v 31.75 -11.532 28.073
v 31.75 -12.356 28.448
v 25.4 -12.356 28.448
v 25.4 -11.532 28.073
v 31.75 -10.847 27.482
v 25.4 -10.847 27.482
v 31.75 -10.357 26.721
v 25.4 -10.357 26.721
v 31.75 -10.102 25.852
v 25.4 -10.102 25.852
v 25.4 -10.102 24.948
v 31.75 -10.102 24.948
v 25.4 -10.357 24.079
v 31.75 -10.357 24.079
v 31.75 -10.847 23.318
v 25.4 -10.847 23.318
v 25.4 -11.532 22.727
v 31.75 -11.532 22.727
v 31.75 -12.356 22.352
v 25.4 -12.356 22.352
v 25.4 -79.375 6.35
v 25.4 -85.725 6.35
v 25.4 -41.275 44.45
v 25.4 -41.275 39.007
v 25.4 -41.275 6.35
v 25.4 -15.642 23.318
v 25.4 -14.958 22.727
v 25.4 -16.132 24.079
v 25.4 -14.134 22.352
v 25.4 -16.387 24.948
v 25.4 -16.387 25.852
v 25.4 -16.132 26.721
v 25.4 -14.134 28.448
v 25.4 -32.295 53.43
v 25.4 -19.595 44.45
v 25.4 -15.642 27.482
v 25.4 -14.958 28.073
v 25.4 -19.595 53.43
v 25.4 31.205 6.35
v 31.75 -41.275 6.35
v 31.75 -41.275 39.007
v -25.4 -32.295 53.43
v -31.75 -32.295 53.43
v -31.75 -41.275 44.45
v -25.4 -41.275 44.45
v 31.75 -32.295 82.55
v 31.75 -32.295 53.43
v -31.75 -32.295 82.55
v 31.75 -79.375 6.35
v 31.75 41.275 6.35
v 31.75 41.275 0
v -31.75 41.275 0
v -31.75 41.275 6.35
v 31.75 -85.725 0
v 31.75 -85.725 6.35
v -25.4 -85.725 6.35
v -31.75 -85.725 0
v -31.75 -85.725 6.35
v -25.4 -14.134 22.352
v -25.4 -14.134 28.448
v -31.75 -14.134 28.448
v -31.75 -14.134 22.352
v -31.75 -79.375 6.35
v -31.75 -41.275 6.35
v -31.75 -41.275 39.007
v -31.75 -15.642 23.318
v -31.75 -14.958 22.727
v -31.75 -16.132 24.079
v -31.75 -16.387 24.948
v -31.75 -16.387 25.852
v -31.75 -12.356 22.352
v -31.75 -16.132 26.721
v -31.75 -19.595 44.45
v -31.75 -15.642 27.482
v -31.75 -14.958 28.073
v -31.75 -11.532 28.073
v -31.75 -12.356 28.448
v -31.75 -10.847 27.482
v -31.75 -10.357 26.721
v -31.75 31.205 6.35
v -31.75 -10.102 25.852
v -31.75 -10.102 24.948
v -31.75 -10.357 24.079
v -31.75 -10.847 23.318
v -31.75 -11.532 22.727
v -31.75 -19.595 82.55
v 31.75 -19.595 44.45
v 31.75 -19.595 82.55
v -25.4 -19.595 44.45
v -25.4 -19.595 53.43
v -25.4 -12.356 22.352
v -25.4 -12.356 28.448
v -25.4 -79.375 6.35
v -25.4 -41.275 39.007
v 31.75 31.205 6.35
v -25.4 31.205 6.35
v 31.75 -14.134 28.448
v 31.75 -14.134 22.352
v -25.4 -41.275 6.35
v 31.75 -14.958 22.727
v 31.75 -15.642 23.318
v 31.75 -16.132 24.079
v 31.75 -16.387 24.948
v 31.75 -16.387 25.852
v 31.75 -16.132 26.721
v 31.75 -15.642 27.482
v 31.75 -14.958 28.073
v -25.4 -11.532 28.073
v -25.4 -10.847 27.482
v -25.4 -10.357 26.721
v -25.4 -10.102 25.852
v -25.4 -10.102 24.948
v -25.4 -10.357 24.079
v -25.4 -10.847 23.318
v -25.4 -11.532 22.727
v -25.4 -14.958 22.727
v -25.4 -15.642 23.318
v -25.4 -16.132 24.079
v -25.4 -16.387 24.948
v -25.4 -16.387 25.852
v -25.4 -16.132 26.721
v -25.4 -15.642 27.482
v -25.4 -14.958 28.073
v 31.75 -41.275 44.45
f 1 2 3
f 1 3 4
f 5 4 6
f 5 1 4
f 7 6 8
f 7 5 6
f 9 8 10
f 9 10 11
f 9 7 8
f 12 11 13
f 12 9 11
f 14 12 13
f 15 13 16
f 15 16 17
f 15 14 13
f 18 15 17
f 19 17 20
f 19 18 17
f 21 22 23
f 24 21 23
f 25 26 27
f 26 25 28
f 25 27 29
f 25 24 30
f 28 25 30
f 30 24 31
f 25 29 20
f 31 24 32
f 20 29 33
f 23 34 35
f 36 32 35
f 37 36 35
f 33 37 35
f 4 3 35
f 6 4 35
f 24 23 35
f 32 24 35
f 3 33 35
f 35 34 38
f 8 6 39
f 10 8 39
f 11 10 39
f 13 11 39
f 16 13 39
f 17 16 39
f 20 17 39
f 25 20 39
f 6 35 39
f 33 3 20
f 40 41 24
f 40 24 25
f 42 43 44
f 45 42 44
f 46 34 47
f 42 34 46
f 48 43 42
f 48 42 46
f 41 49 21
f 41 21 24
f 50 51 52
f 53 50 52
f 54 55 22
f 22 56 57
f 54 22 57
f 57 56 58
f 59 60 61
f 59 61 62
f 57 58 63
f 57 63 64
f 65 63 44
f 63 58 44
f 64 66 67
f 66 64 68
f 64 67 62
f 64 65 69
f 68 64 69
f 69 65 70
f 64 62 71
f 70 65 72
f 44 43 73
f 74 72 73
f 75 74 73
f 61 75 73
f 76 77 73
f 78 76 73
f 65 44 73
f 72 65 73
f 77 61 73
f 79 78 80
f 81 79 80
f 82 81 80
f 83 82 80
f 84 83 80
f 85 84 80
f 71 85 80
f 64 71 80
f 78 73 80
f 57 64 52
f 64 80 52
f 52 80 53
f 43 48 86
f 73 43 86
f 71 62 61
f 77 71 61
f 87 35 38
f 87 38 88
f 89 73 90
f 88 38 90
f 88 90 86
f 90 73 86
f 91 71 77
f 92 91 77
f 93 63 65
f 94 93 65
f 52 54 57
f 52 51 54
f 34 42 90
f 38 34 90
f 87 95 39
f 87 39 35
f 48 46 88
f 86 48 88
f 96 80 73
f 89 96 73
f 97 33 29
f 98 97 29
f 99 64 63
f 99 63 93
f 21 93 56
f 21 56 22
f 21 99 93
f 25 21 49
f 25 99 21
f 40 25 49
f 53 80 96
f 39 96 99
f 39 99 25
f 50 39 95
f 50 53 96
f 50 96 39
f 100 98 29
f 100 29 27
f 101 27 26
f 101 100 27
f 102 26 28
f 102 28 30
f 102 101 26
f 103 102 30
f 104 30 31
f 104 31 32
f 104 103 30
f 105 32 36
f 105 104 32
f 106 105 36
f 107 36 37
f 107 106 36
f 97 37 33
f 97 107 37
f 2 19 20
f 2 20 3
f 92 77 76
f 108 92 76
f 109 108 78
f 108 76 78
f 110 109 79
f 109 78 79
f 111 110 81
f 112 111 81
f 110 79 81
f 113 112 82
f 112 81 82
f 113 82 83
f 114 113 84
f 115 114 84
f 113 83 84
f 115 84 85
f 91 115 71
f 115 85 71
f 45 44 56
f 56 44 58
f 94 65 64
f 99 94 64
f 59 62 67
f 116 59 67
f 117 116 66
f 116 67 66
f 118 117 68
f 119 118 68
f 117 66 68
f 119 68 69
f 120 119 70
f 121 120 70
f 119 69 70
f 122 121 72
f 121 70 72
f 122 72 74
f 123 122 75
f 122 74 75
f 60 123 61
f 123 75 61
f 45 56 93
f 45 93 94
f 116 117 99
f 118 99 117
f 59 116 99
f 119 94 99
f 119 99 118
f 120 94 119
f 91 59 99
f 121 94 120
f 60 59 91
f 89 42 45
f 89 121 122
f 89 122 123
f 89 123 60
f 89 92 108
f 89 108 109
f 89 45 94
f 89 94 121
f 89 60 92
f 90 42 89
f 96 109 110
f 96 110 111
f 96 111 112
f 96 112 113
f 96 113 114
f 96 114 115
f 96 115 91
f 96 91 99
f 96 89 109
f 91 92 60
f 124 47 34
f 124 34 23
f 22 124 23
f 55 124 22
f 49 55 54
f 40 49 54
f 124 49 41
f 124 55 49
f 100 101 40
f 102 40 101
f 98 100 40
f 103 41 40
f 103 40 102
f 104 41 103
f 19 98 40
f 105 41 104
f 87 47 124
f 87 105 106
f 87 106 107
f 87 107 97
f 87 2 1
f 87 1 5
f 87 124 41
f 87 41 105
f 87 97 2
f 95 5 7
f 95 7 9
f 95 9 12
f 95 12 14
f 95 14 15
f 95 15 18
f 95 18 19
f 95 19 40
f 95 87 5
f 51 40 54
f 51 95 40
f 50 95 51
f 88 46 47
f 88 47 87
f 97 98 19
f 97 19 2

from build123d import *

# Parameters (mm, degrees)
F0_W     = 31.75
F0_H     = 82.55
F1_DEPTH = 6.35
F3_DEPTH = 6.35
F2_W     = 12.7
F2_H     = 29.119744
F4_DEPTH = 31.75
F6_DEPTH = 44.45
F8_DEPTH = 6.35


with BuildPart() as f1:
    # F0 (on Top) → F1 (new body)
    with BuildSketch(Plane.XY):
        with Locations((15.875, 0)):
            Rectangle(F0_W, F0_H)
    extrude(amount=F1_DEPTH)

    # F2 (on face) → F3 (join)
    with BuildSketch(Plane.YZ.offset(31.75)):
        Polygon((-41.275, 44.45), (-41.275, 6.35), (31.205256, 6.35), (-19.594744, 44.45), (-19.594744, 53.430256), (-32.294744, 53.430256), align=None)
        with BuildLine():
            ThreePointArc((-12.355744, 28.448), (-10.704744, 27.305), (-10.069744, 25.4))
            ThreePointArc((-10.069744, 25.4), (-10.704744, 23.495), (-12.355744, 22.352))
            ThreePointArc((-12.355744, 22.352), (-13.244744, 22.225), (-14.133744, 22.352))
            ThreePointArc((-14.133744, 22.352), (-16.419744, 25.4), (-14.133744, 28.448))
            ThreePointArc((-14.133744, 28.448), (-13.244744, 28.575), (-12.355744, 28.448))
        make_face(mode=Mode.SUBTRACT)
        with BuildLine():
            Line((-12.355744, 22.352), (-12.355744, 28.448))
            ThreePointArc((-12.355744, 28.448), (-13.244744, 28.575), (-14.133744, 28.448))
            Line((-14.133744, 28.448), (-14.133744, 22.352))
            ThreePointArc((-14.133744, 22.352), (-13.244744, 22.225), (-12.355744, 22.352))
        make_face()
    extrude(amount=-F3_DEPTH)

    # F2 (on face) → F4 (join)
    with BuildSketch(Plane.YZ.offset(31.75)):
        with Locations((-25.944744, 67.990128)):
            Rectangle(F2_W, F2_H)
    extrude(amount=-F4_DEPTH)

    # F5 (on face) → F6 (join)
    with BuildSketch(Plane.XZ.offset(41.275)):
        Polygon((25.4, 6.35), (0, 6.35), (0, 0), (31.75, 0), (31.75, 6.35), align=None)
    extrude(amount=F6_DEPTH)

    # F7 (on face) → F8 (join)
    with BuildSketch(Plane.YZ.offset(31.75)):
        Polygon((-41.275, 44.45), (-85.725, 6.35), (-79.375, 6.35), (-41.275, 39.007143), align=None)
    extrude(amount=-F8_DEPTH)

    # F9: F1 across plane


with BuildPart() as f1_1:
    add(f1.part)
    add(f1.part.mirror(Plane.YZ))


solid = f1_1.part
